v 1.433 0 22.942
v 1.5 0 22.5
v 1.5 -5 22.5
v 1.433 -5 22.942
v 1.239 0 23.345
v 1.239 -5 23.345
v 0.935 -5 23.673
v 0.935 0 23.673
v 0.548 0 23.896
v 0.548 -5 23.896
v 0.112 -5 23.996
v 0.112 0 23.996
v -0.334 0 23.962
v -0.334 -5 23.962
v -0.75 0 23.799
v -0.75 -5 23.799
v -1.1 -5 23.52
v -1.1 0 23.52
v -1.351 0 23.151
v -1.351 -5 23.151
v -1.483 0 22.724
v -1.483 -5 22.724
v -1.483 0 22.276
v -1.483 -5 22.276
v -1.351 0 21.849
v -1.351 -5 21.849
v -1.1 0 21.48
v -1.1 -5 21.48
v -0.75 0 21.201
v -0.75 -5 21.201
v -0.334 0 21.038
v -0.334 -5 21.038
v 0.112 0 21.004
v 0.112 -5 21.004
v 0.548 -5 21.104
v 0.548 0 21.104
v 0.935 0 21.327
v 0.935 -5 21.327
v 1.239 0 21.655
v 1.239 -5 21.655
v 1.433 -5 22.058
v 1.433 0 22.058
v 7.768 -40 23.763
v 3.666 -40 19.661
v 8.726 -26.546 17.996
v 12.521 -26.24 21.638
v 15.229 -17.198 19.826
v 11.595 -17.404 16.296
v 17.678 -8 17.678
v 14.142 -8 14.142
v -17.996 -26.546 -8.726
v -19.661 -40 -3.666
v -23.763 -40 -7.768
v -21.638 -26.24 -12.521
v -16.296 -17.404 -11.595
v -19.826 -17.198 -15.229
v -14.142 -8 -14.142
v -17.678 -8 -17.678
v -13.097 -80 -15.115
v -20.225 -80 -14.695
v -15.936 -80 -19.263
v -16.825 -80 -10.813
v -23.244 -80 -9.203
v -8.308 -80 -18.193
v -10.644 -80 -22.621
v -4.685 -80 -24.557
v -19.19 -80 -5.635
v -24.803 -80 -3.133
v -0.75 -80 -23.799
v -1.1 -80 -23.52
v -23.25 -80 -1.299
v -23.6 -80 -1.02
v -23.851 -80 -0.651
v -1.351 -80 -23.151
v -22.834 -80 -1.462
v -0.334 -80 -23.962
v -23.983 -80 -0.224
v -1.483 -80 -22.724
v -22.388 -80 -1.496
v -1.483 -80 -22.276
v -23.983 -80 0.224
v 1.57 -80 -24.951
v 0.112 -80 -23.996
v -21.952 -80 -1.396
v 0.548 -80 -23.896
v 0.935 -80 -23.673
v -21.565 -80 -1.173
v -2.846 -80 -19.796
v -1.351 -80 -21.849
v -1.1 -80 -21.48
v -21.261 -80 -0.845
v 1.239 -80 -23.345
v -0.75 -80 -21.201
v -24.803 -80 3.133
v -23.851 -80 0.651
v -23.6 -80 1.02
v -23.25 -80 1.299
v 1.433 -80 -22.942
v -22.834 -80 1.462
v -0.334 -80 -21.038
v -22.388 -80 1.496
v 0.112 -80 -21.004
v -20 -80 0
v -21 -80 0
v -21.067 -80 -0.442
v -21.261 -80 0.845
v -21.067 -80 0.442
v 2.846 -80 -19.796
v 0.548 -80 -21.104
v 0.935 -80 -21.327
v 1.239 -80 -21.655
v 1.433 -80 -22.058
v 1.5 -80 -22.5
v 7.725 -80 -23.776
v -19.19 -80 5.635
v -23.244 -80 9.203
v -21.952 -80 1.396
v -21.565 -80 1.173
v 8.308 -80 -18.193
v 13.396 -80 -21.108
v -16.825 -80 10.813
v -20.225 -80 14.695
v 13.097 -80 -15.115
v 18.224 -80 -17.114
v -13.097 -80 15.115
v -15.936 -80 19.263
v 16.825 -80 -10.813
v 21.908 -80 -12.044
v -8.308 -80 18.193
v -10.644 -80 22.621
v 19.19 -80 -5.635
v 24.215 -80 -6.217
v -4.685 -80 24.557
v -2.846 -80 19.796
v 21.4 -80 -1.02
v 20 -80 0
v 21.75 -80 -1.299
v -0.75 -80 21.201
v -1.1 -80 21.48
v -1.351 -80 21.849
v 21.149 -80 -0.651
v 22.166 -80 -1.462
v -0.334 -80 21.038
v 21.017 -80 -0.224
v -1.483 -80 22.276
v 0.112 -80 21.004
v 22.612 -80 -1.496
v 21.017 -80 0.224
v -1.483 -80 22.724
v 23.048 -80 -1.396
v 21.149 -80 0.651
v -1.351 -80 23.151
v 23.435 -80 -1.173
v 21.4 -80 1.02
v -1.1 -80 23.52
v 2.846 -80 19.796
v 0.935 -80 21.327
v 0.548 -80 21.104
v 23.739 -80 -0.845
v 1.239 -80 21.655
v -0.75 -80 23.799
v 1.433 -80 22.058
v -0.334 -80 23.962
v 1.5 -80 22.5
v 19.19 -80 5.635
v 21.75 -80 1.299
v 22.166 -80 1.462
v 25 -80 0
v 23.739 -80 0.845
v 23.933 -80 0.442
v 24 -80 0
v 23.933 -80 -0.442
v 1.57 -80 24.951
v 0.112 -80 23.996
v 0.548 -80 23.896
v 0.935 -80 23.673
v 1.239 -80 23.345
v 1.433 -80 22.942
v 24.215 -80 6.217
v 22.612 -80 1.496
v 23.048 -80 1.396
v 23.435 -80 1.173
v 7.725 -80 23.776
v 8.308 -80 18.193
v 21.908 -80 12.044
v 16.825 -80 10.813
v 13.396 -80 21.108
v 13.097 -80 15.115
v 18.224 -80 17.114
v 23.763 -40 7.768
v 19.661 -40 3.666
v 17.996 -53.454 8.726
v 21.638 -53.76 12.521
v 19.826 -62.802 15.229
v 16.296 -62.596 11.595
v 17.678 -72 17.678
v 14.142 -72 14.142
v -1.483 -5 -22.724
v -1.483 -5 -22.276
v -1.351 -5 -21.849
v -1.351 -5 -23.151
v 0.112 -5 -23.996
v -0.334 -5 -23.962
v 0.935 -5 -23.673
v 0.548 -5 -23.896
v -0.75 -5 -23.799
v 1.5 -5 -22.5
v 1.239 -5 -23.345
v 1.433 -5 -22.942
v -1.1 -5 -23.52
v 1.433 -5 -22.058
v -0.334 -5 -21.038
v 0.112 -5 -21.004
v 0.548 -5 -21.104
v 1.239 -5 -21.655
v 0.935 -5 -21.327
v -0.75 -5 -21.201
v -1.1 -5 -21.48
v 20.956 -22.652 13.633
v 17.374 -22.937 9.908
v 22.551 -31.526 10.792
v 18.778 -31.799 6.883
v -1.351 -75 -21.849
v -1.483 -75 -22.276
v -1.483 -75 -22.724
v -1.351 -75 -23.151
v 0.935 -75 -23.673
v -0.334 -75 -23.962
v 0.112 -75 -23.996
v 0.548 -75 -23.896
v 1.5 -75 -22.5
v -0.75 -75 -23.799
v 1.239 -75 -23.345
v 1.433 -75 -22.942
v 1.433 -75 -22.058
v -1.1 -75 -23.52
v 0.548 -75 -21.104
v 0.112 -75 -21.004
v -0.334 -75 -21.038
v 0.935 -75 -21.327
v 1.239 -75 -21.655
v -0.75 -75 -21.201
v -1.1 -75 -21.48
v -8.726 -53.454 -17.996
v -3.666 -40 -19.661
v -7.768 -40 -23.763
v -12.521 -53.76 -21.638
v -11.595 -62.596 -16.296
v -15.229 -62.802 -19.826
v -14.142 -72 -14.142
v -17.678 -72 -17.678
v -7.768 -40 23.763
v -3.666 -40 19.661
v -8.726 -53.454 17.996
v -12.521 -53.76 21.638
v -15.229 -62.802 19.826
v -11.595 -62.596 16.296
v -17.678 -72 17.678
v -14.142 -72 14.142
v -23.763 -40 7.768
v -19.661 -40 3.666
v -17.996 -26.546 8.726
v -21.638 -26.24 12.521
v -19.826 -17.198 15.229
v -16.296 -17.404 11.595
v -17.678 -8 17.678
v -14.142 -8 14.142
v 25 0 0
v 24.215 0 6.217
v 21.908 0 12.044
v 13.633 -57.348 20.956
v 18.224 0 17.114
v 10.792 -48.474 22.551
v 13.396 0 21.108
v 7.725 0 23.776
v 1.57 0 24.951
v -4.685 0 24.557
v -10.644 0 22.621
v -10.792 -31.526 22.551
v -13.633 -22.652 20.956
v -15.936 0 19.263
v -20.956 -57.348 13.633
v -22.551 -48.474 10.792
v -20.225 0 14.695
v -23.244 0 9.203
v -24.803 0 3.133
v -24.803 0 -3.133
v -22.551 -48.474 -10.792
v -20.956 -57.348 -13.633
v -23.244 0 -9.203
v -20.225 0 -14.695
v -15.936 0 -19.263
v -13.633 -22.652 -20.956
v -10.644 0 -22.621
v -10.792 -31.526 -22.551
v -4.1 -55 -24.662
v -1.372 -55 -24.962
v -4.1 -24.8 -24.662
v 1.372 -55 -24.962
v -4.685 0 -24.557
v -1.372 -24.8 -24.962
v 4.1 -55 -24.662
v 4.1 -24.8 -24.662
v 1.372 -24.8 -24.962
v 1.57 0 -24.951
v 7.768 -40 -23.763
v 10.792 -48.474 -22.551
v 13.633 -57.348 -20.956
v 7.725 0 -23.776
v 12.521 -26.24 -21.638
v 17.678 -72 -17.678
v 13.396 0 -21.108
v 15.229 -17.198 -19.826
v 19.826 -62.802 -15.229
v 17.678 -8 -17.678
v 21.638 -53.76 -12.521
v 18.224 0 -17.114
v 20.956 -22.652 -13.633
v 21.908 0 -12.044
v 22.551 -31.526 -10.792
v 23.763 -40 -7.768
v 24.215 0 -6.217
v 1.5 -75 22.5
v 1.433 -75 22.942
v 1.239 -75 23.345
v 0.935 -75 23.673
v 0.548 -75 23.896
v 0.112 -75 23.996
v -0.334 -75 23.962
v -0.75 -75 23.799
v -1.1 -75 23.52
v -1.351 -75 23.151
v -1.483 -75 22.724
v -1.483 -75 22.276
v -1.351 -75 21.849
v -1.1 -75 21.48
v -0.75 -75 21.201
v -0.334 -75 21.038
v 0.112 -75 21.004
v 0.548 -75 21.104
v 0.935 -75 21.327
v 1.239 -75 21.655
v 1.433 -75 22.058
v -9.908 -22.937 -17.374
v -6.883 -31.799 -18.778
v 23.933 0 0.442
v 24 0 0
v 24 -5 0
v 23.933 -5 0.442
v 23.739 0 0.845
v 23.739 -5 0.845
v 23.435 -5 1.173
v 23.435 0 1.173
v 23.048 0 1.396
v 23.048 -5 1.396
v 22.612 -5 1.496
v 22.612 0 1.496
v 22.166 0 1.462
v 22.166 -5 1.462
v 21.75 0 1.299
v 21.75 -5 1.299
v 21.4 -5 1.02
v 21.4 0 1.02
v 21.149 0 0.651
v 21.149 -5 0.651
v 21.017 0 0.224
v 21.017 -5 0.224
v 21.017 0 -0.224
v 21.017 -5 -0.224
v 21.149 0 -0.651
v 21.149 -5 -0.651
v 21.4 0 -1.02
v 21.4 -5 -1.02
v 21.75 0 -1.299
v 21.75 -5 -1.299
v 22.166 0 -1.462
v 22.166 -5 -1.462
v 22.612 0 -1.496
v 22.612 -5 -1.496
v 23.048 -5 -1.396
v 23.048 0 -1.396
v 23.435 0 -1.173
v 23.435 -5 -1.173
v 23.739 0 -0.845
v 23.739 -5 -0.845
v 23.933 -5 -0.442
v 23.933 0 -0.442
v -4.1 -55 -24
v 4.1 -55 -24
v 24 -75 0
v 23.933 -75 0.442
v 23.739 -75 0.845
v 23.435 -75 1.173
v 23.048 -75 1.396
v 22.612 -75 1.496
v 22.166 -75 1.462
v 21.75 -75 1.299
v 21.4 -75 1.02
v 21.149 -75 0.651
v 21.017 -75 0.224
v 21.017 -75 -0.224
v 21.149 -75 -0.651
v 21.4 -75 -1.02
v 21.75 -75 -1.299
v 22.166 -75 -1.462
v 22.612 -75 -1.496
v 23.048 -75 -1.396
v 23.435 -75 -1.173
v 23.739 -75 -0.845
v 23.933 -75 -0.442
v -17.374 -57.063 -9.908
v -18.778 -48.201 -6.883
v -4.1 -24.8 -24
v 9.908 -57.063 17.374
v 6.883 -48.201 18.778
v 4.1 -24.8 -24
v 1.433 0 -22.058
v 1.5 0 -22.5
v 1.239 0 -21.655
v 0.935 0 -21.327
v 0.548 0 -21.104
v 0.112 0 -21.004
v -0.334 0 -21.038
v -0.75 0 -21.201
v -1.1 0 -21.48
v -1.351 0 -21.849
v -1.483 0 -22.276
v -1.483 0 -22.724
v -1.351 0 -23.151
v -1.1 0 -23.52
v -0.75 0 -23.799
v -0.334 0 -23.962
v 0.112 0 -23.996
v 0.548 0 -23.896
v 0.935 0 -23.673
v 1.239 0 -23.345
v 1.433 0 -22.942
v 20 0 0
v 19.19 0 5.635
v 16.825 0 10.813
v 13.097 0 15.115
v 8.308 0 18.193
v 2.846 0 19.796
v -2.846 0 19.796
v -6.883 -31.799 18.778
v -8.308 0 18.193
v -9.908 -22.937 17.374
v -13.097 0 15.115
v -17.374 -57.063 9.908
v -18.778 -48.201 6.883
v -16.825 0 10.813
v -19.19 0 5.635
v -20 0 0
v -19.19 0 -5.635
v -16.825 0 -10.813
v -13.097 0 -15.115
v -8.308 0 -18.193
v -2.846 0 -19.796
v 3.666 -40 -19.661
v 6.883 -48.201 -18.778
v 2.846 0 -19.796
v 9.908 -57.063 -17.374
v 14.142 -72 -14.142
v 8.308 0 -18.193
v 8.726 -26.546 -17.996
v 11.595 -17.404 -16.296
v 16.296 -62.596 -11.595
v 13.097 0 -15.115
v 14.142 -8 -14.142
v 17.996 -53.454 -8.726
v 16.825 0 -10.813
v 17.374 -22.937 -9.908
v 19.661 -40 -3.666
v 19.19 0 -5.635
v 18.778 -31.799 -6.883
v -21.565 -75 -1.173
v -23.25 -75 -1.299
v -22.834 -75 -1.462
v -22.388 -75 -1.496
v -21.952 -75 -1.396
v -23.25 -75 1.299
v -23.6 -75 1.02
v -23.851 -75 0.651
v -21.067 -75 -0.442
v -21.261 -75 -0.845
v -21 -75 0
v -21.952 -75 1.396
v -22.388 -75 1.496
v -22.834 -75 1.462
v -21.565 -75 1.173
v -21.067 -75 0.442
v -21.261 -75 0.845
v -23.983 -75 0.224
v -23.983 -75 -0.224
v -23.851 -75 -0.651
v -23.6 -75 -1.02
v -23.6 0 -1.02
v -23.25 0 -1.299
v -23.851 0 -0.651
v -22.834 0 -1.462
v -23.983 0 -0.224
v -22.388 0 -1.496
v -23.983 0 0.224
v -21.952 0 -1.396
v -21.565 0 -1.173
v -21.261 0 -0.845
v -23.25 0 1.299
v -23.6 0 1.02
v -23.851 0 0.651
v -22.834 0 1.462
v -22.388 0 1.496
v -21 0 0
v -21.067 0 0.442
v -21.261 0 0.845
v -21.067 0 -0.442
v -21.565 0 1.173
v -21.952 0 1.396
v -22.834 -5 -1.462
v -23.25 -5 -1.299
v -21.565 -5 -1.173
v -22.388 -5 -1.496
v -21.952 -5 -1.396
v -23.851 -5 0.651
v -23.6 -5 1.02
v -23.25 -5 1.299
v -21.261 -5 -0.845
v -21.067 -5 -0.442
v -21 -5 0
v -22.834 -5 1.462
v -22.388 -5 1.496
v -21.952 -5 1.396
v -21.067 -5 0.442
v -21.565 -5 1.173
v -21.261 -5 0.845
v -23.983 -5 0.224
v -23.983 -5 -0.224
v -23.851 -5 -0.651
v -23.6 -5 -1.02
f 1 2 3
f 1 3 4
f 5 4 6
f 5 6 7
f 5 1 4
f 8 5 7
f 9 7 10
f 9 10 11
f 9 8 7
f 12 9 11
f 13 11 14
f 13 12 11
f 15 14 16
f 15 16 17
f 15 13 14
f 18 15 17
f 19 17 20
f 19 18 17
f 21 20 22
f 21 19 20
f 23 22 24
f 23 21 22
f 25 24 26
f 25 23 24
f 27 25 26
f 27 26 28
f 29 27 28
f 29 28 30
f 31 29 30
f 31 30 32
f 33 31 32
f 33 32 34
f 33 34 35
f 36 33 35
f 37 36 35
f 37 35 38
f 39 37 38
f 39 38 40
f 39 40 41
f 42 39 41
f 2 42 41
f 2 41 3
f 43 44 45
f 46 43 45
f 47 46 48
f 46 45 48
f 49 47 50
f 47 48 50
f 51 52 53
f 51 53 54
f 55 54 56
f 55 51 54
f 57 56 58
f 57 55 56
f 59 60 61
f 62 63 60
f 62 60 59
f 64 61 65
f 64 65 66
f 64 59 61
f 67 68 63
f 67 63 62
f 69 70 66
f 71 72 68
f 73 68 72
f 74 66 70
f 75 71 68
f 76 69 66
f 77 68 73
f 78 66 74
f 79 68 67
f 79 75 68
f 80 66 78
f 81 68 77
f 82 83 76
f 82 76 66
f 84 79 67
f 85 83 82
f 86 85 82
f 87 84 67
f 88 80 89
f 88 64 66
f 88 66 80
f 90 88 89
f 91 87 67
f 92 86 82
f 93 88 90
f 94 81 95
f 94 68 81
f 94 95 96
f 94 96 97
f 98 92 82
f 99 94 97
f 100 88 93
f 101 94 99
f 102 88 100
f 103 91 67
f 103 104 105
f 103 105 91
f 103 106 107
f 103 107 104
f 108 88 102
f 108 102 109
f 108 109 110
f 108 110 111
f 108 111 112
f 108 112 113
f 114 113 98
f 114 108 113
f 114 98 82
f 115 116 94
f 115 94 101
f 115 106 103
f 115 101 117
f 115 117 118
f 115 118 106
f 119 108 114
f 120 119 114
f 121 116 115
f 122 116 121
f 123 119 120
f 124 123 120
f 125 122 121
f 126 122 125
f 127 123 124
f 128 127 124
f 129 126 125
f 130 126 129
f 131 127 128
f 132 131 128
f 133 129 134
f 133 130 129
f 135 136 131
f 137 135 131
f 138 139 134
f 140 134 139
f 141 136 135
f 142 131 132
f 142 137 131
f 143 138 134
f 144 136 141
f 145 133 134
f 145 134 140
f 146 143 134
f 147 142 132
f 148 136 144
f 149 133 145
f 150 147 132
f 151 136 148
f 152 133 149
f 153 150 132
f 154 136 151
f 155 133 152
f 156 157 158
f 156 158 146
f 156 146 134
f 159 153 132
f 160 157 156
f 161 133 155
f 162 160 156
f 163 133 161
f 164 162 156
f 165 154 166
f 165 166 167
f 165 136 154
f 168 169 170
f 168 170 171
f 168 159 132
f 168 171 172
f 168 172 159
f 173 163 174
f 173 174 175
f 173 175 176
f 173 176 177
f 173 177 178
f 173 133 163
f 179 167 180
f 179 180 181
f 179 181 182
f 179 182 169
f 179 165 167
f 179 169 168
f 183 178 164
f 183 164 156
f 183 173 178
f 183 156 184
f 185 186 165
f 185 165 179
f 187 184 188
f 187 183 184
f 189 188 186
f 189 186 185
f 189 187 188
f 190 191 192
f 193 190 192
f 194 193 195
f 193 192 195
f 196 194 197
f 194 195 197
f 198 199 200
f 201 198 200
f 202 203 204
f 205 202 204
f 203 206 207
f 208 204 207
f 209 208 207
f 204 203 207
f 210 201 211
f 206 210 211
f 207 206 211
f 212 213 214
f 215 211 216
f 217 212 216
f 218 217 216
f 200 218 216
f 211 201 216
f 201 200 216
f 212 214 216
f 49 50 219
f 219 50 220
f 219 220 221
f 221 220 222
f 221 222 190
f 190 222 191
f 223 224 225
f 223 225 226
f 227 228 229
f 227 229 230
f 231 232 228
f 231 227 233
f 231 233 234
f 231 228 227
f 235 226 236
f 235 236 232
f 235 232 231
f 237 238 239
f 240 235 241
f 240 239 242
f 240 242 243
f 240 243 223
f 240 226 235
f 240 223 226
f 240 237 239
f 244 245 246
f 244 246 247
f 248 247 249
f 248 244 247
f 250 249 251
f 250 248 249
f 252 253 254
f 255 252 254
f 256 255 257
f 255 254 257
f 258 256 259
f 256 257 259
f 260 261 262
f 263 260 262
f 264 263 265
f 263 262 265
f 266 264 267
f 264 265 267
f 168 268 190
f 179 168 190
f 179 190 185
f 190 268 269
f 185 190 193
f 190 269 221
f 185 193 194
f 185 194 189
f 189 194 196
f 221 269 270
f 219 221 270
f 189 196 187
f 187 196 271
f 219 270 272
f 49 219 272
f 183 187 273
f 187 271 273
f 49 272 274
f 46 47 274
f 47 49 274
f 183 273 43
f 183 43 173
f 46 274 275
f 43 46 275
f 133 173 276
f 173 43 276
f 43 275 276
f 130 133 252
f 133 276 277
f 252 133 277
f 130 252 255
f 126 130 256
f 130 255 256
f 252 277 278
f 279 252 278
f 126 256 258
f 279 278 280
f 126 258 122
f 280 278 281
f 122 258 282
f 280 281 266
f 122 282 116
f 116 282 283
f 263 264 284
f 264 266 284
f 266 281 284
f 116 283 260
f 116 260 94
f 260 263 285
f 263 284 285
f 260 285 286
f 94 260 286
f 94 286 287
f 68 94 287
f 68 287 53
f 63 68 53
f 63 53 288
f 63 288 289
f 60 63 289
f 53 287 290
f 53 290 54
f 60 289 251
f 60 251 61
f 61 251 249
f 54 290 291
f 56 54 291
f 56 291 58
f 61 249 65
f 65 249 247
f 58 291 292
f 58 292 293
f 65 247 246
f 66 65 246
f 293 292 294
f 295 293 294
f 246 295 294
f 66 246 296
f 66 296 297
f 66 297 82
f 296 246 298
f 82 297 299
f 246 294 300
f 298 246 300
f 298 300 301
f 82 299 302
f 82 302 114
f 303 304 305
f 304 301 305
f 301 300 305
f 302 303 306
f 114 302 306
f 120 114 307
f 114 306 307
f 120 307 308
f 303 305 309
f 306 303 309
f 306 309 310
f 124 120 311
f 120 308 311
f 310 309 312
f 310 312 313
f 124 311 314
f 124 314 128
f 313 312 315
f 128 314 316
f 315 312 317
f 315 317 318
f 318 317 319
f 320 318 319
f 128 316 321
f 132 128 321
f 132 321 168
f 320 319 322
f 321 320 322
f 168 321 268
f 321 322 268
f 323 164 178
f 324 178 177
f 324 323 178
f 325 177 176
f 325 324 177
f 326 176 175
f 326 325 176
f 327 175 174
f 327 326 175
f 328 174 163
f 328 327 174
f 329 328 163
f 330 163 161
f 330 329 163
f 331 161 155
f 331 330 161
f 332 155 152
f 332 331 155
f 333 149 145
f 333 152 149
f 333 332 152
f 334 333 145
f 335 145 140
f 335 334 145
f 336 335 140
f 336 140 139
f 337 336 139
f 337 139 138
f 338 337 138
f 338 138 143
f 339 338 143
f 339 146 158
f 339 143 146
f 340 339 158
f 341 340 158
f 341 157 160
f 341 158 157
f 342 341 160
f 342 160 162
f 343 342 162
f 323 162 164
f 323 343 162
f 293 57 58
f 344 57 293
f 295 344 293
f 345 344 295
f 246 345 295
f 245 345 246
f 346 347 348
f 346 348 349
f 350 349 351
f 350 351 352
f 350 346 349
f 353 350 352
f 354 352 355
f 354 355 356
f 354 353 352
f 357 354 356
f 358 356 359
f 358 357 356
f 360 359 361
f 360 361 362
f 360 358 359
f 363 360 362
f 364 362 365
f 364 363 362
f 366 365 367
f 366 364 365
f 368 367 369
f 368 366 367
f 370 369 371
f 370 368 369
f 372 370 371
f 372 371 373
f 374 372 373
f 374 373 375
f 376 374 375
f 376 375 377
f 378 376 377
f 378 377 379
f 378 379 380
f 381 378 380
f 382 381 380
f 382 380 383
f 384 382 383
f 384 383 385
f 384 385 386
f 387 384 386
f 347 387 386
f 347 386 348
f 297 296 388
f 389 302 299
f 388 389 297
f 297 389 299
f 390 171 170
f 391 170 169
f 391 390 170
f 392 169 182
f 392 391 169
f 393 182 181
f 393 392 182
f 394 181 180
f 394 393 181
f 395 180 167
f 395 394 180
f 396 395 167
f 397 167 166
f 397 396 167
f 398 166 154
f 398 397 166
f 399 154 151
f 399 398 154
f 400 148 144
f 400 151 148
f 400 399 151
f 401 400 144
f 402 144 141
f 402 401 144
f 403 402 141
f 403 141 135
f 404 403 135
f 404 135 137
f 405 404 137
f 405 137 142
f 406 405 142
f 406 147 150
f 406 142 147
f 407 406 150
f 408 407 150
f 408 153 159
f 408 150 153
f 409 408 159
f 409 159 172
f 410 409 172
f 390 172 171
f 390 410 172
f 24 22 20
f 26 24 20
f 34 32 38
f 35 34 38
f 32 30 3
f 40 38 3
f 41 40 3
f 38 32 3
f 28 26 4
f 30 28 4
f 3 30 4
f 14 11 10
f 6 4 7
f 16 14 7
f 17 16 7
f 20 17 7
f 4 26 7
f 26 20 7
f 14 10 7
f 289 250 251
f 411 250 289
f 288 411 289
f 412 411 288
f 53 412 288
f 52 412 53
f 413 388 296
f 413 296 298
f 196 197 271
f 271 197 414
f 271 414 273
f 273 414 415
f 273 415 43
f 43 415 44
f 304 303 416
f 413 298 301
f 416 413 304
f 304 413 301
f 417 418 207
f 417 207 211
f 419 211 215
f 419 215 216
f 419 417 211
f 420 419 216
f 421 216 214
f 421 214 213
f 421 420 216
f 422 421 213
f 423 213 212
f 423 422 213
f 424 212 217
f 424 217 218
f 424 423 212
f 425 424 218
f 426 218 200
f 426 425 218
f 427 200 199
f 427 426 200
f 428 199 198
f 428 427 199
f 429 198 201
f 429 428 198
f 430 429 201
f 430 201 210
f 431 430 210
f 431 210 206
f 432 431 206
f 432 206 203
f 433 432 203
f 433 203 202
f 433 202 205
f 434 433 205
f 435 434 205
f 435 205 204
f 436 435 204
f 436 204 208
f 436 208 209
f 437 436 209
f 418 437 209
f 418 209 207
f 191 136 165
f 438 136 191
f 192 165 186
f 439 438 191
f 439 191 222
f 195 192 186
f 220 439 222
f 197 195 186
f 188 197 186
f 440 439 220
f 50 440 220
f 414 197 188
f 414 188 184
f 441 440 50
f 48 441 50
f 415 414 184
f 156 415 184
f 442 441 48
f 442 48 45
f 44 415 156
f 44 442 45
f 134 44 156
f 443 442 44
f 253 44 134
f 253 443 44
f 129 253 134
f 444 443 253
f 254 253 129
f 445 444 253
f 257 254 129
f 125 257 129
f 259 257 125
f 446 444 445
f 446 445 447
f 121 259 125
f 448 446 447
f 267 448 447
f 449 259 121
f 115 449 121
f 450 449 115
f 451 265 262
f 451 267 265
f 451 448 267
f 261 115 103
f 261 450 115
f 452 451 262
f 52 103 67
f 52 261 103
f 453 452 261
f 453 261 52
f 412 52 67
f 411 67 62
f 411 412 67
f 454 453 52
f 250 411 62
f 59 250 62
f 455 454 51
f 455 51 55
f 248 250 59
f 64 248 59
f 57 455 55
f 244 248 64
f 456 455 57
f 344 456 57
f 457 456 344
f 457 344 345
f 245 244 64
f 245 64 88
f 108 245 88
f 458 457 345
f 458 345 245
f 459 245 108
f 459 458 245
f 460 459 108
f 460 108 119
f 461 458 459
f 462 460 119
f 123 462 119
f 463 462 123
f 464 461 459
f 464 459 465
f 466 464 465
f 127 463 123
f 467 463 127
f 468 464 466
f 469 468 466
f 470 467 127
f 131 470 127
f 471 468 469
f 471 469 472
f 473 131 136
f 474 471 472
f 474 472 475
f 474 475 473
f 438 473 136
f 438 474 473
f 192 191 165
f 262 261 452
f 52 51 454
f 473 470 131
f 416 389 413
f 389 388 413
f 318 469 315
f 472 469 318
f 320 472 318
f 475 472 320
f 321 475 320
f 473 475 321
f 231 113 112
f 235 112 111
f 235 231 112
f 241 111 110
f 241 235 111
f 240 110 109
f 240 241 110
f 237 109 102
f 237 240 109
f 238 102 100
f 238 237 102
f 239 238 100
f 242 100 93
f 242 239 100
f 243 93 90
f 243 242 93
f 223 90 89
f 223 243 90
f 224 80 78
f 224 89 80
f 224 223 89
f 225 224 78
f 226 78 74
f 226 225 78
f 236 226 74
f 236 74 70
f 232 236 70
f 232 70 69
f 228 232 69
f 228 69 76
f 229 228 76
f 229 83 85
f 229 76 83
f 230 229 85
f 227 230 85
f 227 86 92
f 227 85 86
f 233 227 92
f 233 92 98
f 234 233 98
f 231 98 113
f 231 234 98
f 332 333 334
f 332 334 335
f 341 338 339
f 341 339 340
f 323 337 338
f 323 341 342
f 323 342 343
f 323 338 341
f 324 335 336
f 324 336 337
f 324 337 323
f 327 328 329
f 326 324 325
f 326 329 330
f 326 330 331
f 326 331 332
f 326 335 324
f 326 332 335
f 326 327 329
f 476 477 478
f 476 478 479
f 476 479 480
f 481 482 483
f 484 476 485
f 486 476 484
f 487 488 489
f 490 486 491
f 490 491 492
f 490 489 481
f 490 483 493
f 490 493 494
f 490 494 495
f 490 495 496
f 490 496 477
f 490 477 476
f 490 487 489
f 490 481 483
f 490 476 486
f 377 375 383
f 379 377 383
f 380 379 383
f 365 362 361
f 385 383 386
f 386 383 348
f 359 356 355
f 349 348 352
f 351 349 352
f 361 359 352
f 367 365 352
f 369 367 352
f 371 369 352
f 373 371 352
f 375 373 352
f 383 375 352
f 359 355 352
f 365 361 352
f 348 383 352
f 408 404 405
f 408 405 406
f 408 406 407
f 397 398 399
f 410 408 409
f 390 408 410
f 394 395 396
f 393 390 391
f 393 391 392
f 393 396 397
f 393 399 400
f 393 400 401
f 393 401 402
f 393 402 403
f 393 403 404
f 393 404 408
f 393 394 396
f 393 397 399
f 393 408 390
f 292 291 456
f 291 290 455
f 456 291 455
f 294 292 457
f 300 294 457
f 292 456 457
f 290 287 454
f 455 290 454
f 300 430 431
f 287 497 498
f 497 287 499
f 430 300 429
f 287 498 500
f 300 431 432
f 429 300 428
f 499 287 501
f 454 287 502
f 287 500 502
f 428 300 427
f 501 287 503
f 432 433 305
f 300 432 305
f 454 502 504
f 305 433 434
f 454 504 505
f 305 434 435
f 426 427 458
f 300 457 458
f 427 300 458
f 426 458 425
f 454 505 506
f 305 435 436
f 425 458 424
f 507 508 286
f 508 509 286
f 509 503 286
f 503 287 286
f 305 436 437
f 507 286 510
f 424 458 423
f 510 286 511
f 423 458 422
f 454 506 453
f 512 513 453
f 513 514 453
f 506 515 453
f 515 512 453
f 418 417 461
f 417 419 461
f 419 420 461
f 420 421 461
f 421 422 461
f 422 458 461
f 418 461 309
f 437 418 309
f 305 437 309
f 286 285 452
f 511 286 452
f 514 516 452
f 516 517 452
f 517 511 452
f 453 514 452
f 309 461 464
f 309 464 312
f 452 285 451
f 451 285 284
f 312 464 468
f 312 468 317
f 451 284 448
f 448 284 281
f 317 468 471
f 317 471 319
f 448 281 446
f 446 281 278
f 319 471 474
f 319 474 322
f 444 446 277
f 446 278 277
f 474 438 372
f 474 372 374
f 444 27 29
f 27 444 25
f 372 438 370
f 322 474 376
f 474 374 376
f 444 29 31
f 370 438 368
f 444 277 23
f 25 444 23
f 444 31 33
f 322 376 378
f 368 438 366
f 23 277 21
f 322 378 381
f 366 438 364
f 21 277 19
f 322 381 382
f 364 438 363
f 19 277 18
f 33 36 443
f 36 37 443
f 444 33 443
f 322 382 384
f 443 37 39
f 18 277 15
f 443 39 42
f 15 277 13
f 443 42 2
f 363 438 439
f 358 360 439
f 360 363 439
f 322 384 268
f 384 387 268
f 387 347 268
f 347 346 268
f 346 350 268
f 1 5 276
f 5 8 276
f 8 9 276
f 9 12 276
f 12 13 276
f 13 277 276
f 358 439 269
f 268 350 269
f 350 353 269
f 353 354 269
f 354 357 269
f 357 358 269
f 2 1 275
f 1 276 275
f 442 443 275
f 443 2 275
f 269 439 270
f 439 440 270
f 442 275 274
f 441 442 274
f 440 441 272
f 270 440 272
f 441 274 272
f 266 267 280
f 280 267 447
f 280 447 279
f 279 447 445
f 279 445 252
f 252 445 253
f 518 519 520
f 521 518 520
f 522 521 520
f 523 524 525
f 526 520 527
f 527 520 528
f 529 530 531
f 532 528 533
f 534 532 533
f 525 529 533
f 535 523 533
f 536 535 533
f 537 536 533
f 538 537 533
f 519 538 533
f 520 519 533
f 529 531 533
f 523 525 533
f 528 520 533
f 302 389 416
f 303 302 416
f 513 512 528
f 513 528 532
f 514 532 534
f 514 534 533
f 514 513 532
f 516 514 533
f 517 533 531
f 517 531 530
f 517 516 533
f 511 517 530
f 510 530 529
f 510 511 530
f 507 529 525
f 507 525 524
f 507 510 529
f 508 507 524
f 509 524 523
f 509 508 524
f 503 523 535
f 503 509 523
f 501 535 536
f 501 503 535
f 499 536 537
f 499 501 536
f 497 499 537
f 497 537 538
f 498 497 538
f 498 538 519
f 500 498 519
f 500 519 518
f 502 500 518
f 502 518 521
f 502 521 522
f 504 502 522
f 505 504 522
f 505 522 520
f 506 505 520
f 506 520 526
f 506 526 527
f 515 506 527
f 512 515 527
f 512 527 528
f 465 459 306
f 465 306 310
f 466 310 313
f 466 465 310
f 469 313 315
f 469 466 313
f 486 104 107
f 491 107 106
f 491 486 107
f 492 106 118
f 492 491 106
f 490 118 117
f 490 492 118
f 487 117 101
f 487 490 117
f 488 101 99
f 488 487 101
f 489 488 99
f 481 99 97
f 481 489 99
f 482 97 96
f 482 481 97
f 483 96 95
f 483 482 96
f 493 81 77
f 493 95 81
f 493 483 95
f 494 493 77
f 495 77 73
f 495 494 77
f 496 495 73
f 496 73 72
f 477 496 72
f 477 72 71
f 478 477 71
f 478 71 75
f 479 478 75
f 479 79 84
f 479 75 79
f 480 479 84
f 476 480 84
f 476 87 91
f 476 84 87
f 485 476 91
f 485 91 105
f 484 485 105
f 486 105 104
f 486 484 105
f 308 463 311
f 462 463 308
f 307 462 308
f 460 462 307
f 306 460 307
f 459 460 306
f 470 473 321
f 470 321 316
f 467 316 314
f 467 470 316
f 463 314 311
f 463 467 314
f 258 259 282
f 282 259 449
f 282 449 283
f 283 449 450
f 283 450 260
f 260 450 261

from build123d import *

# Parameters (mm, degrees)
F0_R           = 25
F0_R_2         = 20
F4_DEPTH       = 80
F5_R           = 1.5
F6_DEPTH       = 84
F6_DEPTH_BACK  = 4
F8_DEPTH       = 35.3563390593
F8_DEPTH_BACK  = 25
F10_DEPTH      = 35.3563390593
F10_DEPTH_BACK = 25
F13_R          = 1.5
F14_DEPTH      = 35
F14_DEPTH_BACK = 35
F11_W          = 30.2
F11_H          = 4
F11_R          = 3.5
F15_DEPTH      = 4.1
F15_DEPTH_BACK = 4.1


with BuildPart() as f4:
    # F0 (on Front) → F4 (new body)
    with BuildSketch(Plane.XZ):
        Circle(F0_R)
        Circle(F0_R_2, mode=Mode.SUBTRACT)
    extrude(amount=F4_DEPTH)

    # F5 (on Front) → F6 (cut, two sides)
    with BuildSketch(Plane.XZ) as f6_sk:
        with Locations((0, 22.5)):
            Circle(F5_R)
        with Locations((0, -22.5)):
            Circle(F5_R)
        with Locations((-22.5, 0)):
            Circle(F5_R)
        with Locations((22.5, 0)):
            Circle(F5_R)
    extrude(amount=F6_DEPTH, mode=Mode.SUBTRACT)
    extrude(f6_sk.sketch, amount=-F6_DEPTH_BACK, mode=Mode.SUBTRACT)

    # F7 (on line) → F8 (cut, two sides)
    with BuildSketch(Plane(origin=(0, 0, 0), x_dir=(0.7071067812, 0, 0.7071067812), z_dir=(0.7071067812, 0, -0.7071067812))) as f8_sk:
        Polygon((-11.31, 40), (0, 8), (11.31, 40), (0, 72), align=None)
    extrude(amount=-F8_DEPTH, mode=Mode.SUBTRACT)
    extrude(f8_sk.sketch, amount=F8_DEPTH_BACK, mode=Mode.SUBTRACT)

    # F9 (on line) → F10 (cut, two sides)
    with BuildSketch(Plane(origin=(0, 0, 0), x_dir=(0.7071067812, 0, -0.7071067812), z_dir=(-0.7071067812, 0, -0.7071067812))) as f10_sk:
        Polygon((-11.31, 40), (0, 8), (11.31, 40), (0, 72), align=None)
    extrude(amount=-F10_DEPTH, mode=Mode.SUBTRACT)
    extrude(f10_sk.sketch, amount=F10_DEPTH_BACK, mode=Mode.SUBTRACT)

    # F13 (on offset) → F14 (join, two sides)
    with BuildSketch(Plane.XZ.offset(40)) as f14_sk:
        with Locations((0, 22.5)):
            Circle(F13_R)
        with Locations((0, -22.5)):
            Circle(F13_R)
        with Locations((22.5, 0)):
            Circle(F13_R)
        with Locations((-22.5, 0)):
            Circle(F13_R)
    extrude(amount=F14_DEPTH)
    extrude(f14_sk.sketch, amount=-F14_DEPTH_BACK)

    # F11 (on Right) → F15 (cut, two sides)
    with BuildSketch(Plane.YZ) as f15_sk:
        with Locations((-39.9, -26)):
            Rectangle(F11_W, F11_H)
        with BuildLine():
            Line((-24.8, -28), (-55, -28))
            Line((-55, -28), (-53.4000304969, -28.5403946475))
            ThreePointArc((-53.4000304969, -28.5403946475), (-50.9379901825, -30.3620036381), (-50, -33.2774926609))
            Line((-50, -33.2774926609), (-50, -43.9965311409))
            ThreePointArc((-50, -43.9965311409), (-48.5355339059, -47.5320650468), (-45, -48.9965311409))
            Line((-45, -48.9965311409), (-35, -48.9965311409))
            ThreePointArc((-35, -48.9965311409), (-31.4644660941, -47.5320650468), (-30, -43.9965311409))
            Line((-30, -43.9965311409), (-30, -33.1293155523))
            ThreePointArc((-30, -33.1293155523), (-28.853919359, -29.9438319824), (-25.9410777703, -28.2186768331))
            Line((-25.9410777703, -28.2186768331), (-24.8, -28))
        make_face()
        with Locations((-40, -38.9965311409)):
            Circle(F11_R, mode=Mode.SUBTRACT)
    extrude(amount=F15_DEPTH, mode=Mode.SUBTRACT)
    extrude(f15_sk.sketch, amount=-F15_DEPTH_BACK, mode=Mode.SUBTRACT)


solid = f4.part
